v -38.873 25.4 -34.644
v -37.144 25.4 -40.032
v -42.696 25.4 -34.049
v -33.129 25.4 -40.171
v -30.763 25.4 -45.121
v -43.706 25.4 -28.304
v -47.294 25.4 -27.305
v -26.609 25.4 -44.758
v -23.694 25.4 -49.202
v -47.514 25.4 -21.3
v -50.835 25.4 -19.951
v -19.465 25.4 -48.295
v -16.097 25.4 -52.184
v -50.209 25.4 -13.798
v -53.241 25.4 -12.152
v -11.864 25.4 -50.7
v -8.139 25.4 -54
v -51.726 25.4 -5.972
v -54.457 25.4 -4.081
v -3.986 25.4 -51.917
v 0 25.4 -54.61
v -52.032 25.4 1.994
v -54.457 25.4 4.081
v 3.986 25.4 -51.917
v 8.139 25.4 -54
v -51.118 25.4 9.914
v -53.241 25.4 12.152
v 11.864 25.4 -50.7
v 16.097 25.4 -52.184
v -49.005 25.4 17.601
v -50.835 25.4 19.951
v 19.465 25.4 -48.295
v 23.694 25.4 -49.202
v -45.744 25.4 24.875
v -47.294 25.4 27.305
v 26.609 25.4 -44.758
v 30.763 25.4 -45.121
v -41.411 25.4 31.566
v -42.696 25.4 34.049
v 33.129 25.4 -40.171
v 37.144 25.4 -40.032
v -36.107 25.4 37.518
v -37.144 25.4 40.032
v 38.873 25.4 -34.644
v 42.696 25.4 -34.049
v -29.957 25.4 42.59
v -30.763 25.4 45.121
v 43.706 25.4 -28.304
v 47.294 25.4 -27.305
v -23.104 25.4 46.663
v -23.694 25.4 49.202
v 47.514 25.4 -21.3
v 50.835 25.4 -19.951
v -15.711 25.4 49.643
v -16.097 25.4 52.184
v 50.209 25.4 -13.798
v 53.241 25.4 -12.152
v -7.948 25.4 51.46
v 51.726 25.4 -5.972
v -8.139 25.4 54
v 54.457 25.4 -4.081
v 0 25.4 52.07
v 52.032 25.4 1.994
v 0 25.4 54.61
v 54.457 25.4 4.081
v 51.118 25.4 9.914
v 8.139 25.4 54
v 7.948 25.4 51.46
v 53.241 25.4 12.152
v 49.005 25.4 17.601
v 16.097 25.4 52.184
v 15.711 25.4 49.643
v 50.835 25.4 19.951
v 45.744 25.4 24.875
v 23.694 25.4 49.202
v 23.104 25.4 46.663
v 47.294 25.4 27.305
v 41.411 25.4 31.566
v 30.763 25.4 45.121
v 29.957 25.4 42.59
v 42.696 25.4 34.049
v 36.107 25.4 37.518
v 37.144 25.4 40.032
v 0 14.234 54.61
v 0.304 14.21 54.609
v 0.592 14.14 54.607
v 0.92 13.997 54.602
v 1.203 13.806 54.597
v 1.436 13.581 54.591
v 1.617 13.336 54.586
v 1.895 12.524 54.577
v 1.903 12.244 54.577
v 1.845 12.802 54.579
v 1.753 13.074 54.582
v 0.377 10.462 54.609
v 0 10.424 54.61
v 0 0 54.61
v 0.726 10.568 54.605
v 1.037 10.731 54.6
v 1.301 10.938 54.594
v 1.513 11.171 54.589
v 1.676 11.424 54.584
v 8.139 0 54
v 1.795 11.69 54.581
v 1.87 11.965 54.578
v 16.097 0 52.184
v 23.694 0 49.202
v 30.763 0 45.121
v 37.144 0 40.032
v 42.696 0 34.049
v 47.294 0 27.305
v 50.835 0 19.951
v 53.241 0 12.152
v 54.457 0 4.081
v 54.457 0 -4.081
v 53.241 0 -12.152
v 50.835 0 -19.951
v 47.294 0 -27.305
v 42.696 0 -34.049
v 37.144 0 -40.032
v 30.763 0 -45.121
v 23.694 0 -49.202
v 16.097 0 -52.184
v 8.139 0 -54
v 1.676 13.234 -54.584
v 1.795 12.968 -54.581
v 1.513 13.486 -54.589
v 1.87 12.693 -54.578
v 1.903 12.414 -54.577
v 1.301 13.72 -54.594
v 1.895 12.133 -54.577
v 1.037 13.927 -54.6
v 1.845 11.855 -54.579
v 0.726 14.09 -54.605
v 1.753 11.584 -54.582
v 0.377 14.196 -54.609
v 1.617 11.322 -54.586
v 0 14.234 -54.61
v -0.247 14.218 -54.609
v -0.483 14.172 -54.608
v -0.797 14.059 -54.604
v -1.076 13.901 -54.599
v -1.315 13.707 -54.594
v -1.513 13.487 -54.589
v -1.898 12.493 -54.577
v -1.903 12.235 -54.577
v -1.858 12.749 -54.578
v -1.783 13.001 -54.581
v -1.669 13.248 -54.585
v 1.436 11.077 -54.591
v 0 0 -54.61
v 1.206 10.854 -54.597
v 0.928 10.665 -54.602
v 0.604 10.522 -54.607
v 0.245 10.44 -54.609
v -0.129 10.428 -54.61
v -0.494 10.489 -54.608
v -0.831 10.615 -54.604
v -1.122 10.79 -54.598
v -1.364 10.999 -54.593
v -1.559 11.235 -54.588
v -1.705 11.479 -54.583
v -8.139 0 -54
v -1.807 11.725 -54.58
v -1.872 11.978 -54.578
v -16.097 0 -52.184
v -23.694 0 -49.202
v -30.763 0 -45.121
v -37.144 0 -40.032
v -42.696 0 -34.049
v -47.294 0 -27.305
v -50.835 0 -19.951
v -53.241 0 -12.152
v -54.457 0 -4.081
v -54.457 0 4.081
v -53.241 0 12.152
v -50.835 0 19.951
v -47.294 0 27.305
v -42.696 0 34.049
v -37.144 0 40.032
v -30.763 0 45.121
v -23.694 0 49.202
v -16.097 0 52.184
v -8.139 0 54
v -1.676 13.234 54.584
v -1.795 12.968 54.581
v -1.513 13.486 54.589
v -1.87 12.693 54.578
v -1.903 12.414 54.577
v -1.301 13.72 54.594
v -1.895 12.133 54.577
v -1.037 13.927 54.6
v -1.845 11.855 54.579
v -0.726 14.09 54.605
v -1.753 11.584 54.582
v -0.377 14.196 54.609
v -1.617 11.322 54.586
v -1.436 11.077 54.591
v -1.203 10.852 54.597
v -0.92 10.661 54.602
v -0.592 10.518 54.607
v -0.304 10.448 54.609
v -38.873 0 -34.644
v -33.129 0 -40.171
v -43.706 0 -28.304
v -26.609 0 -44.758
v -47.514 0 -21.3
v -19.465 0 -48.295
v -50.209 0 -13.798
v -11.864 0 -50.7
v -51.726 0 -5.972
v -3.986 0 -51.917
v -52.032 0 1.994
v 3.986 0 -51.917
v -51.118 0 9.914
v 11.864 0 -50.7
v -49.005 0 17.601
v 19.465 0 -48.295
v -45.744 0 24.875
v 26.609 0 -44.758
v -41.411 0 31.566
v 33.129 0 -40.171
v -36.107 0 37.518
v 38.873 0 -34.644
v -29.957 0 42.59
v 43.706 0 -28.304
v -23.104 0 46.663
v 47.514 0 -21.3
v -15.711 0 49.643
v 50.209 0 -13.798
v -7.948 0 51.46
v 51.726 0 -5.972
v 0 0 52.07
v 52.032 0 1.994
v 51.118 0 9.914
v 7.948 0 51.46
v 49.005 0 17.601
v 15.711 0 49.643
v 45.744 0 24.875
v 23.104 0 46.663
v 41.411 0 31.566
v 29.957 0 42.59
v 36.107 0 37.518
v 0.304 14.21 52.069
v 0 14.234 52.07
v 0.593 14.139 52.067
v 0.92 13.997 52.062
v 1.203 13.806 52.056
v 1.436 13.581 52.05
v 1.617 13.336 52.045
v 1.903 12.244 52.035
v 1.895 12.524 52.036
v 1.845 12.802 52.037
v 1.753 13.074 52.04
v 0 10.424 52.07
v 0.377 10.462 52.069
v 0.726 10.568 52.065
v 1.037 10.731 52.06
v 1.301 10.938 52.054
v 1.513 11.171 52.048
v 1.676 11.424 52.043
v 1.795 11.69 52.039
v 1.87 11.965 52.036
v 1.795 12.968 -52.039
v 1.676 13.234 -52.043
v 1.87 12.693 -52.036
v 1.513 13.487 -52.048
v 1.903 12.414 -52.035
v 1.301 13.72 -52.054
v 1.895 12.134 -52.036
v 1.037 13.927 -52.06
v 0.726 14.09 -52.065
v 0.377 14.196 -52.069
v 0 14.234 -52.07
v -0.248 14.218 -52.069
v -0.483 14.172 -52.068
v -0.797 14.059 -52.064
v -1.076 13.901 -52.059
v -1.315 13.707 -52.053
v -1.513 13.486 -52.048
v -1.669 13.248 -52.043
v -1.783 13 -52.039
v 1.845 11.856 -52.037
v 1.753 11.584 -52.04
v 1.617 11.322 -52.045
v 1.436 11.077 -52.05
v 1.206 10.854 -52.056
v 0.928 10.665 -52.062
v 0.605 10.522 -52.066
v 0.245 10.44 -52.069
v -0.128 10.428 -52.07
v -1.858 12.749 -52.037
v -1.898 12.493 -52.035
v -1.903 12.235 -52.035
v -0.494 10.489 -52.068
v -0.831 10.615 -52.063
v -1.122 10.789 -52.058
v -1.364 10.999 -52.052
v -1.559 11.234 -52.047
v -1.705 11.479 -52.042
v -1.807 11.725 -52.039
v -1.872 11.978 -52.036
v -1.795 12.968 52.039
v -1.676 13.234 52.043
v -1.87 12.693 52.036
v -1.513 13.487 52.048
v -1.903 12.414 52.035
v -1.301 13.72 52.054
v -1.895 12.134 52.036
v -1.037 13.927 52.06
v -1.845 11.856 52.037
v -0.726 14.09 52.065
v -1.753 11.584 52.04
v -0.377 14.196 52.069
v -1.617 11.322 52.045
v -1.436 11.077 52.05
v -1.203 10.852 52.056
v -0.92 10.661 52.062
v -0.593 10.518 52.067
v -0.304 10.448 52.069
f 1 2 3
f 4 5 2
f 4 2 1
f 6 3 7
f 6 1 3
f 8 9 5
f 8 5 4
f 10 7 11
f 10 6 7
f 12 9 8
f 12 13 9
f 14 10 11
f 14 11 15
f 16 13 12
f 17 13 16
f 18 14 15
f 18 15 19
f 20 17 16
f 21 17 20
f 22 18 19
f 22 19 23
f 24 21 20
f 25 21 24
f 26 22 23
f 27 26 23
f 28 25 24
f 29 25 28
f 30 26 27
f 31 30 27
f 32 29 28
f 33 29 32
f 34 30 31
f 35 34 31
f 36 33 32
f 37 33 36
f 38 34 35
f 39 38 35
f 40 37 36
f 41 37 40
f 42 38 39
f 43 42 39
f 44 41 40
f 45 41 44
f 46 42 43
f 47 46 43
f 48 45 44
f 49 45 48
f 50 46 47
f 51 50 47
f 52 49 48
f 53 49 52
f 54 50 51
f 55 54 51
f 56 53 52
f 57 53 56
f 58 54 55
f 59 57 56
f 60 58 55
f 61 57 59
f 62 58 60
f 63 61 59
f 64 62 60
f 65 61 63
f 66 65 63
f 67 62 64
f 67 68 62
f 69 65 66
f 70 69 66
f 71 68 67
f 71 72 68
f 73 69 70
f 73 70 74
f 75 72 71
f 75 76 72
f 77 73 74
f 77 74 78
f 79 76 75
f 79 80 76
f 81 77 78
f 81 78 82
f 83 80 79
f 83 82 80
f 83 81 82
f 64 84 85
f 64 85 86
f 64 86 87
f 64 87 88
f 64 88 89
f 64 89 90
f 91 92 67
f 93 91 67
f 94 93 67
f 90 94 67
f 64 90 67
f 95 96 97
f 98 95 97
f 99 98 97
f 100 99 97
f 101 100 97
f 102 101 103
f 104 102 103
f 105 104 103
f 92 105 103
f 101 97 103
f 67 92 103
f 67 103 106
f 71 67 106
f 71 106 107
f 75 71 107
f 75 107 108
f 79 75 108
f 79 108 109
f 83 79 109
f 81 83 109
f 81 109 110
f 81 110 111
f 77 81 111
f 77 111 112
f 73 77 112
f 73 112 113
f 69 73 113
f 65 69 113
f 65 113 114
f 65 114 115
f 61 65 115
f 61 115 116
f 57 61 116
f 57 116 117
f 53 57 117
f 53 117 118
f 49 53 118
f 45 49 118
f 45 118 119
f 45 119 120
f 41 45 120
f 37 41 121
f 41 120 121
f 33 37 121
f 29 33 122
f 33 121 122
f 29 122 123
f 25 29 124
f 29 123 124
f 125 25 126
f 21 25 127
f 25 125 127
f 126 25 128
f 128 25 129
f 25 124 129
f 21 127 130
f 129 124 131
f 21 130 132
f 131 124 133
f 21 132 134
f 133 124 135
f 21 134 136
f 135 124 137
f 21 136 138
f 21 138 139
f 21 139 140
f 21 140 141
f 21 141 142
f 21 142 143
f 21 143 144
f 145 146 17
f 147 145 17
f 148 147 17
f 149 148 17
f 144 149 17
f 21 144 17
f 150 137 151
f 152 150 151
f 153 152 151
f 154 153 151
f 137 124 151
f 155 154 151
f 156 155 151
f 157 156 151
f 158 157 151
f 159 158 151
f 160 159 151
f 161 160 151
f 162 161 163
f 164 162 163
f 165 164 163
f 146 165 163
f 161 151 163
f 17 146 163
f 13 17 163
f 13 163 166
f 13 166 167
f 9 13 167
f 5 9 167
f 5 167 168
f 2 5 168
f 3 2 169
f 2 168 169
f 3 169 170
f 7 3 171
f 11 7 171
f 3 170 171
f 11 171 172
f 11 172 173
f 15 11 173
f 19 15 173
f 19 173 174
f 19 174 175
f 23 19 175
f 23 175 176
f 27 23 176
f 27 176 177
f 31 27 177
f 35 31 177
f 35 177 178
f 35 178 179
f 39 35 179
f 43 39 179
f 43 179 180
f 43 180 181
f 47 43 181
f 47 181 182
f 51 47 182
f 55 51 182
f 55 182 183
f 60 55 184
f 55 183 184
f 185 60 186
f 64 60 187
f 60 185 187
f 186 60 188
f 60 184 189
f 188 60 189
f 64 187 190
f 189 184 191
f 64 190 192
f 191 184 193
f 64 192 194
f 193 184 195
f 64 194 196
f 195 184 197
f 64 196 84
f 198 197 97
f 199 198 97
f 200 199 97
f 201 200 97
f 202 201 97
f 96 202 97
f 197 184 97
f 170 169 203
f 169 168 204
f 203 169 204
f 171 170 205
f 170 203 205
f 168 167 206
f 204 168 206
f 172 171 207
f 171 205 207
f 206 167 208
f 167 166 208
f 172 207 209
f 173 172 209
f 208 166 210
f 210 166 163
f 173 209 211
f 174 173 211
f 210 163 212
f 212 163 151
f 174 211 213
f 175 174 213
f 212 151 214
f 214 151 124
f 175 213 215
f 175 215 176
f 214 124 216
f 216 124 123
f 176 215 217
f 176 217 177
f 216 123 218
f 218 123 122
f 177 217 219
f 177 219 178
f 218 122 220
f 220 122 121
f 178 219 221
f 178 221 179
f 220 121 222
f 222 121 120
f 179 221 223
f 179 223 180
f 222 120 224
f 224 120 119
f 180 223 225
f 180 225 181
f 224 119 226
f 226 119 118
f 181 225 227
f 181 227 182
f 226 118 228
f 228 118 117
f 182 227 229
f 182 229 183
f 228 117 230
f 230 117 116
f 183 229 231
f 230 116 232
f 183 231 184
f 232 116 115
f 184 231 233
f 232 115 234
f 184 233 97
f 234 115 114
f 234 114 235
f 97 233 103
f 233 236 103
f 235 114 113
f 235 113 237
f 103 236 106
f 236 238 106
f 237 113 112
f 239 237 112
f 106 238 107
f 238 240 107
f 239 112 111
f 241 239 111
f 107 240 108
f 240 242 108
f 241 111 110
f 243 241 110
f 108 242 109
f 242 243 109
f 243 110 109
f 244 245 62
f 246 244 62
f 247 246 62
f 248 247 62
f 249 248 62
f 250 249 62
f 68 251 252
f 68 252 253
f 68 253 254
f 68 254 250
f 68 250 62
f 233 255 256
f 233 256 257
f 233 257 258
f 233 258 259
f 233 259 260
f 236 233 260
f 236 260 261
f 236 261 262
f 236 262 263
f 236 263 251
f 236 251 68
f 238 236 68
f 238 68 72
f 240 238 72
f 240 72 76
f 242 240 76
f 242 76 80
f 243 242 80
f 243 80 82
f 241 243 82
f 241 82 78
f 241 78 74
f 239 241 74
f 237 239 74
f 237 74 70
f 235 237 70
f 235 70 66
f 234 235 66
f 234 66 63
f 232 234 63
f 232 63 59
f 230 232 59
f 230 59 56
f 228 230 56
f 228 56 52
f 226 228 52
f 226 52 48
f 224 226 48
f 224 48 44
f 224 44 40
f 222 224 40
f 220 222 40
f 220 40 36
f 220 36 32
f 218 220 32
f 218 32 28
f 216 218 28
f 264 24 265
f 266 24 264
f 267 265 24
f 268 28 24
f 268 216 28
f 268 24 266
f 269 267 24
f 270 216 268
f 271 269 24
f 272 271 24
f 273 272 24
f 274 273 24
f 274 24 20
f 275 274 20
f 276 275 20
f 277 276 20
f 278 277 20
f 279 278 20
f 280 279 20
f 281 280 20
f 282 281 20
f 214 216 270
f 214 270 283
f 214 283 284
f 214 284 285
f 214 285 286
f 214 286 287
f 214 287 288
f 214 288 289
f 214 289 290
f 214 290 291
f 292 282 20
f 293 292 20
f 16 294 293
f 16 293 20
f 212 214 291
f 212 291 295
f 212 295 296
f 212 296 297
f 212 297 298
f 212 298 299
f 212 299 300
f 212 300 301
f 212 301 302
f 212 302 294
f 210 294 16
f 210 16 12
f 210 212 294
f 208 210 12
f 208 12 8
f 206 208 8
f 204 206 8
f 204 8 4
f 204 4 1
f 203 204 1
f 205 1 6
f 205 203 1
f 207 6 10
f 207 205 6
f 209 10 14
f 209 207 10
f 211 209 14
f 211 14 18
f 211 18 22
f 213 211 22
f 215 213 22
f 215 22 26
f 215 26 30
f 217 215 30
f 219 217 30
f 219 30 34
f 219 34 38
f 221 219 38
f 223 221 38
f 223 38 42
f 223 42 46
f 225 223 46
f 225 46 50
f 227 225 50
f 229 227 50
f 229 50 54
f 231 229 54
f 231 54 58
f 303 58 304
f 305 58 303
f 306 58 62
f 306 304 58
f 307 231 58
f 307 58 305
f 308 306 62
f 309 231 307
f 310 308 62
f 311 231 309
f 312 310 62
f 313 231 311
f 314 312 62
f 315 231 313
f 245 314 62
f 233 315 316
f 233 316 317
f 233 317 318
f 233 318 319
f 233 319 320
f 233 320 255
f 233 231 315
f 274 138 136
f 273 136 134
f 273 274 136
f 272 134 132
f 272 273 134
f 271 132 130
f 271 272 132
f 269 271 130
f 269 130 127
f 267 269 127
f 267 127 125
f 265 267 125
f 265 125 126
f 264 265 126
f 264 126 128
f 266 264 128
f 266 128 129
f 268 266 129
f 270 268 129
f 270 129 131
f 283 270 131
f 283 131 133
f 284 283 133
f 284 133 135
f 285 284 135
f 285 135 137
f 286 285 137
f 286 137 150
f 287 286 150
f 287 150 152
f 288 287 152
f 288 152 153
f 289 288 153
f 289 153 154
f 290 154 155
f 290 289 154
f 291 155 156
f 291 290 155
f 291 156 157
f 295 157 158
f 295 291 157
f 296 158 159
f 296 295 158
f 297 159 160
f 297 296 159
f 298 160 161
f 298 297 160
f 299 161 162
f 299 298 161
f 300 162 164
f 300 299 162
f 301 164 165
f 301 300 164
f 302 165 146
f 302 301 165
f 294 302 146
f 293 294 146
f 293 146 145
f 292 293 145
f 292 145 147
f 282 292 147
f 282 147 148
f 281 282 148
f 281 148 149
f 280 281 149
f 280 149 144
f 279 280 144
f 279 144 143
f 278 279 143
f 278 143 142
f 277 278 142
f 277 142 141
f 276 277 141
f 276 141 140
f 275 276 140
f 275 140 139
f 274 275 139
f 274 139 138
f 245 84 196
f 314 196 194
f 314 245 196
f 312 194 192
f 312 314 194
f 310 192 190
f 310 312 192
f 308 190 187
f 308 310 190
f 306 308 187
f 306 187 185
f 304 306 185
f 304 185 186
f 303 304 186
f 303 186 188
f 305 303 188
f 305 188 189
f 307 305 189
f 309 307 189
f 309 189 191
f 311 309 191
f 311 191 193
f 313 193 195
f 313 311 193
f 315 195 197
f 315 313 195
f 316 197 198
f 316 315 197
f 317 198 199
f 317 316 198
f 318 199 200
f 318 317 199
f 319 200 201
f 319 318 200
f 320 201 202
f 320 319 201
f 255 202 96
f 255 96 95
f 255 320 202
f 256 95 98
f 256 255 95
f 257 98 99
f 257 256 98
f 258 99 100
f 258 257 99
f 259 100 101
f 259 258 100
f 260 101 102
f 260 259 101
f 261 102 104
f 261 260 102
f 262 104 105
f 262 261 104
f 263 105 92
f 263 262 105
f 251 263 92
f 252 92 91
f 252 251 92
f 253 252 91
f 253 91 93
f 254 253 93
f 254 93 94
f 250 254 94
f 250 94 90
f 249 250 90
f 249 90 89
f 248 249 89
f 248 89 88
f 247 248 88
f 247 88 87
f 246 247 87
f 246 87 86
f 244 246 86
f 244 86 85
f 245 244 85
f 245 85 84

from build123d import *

# Parameters (mm, degrees)
SKETCH1_R           = 54.61
SKETCH1_R_2         = 52.07
BOSS_EXTRUDE1_DEPTH = 25.4
SKETCH3_R           = 1.905
CUT_EXTRUDE1_DEPTH  = 82.299841328
CIRPATTERN1_COUNT   = 2


with BuildPart() as part:
    # Sketch1 → Boss-Extrude1 (new body)
    with BuildSketch(Plane(origin=(0, 0, 0), x_dir=(1, 0, 0), z_dir=(0, 1, 0))):
        with Locations(Location((0, 0, 0), (0, 0, 270))):
            Circle(SKETCH1_R)
        with Locations(Location((0, 0, 0), (0, 0, 270))):
            Circle(SKETCH1_R_2, mode=Mode.SUBTRACT)
    extrude(amount=BOSS_EXTRUDE1_DEPTH)

    # Sketch3 → Cut-Extrude1 (cut, through all)
    with BuildSketch(Plane.XY):
        with Locations(Location((0, 12.328955527, 0), (0, 0, 90.000000049))):
            Circle(SKETCH3_R)
    cut_extrude1 = extrude(amount=CUT_EXTRUDE1_DEPTH, mode=Mode.SUBTRACT)

    # CirPattern1: Cut-Extrude1 ×2 about axis
    cirpattern1_axis = Axis((0, 25.4, 0), (0, 1, 0))
    for i in range(1, CIRPATTERN1_COUNT):
        add(cut_extrude1.rotate(cirpattern1_axis, i * 360 / CIRPATTERN1_COUNT), mode=Mode.SUBTRACT)


solid = part.part
